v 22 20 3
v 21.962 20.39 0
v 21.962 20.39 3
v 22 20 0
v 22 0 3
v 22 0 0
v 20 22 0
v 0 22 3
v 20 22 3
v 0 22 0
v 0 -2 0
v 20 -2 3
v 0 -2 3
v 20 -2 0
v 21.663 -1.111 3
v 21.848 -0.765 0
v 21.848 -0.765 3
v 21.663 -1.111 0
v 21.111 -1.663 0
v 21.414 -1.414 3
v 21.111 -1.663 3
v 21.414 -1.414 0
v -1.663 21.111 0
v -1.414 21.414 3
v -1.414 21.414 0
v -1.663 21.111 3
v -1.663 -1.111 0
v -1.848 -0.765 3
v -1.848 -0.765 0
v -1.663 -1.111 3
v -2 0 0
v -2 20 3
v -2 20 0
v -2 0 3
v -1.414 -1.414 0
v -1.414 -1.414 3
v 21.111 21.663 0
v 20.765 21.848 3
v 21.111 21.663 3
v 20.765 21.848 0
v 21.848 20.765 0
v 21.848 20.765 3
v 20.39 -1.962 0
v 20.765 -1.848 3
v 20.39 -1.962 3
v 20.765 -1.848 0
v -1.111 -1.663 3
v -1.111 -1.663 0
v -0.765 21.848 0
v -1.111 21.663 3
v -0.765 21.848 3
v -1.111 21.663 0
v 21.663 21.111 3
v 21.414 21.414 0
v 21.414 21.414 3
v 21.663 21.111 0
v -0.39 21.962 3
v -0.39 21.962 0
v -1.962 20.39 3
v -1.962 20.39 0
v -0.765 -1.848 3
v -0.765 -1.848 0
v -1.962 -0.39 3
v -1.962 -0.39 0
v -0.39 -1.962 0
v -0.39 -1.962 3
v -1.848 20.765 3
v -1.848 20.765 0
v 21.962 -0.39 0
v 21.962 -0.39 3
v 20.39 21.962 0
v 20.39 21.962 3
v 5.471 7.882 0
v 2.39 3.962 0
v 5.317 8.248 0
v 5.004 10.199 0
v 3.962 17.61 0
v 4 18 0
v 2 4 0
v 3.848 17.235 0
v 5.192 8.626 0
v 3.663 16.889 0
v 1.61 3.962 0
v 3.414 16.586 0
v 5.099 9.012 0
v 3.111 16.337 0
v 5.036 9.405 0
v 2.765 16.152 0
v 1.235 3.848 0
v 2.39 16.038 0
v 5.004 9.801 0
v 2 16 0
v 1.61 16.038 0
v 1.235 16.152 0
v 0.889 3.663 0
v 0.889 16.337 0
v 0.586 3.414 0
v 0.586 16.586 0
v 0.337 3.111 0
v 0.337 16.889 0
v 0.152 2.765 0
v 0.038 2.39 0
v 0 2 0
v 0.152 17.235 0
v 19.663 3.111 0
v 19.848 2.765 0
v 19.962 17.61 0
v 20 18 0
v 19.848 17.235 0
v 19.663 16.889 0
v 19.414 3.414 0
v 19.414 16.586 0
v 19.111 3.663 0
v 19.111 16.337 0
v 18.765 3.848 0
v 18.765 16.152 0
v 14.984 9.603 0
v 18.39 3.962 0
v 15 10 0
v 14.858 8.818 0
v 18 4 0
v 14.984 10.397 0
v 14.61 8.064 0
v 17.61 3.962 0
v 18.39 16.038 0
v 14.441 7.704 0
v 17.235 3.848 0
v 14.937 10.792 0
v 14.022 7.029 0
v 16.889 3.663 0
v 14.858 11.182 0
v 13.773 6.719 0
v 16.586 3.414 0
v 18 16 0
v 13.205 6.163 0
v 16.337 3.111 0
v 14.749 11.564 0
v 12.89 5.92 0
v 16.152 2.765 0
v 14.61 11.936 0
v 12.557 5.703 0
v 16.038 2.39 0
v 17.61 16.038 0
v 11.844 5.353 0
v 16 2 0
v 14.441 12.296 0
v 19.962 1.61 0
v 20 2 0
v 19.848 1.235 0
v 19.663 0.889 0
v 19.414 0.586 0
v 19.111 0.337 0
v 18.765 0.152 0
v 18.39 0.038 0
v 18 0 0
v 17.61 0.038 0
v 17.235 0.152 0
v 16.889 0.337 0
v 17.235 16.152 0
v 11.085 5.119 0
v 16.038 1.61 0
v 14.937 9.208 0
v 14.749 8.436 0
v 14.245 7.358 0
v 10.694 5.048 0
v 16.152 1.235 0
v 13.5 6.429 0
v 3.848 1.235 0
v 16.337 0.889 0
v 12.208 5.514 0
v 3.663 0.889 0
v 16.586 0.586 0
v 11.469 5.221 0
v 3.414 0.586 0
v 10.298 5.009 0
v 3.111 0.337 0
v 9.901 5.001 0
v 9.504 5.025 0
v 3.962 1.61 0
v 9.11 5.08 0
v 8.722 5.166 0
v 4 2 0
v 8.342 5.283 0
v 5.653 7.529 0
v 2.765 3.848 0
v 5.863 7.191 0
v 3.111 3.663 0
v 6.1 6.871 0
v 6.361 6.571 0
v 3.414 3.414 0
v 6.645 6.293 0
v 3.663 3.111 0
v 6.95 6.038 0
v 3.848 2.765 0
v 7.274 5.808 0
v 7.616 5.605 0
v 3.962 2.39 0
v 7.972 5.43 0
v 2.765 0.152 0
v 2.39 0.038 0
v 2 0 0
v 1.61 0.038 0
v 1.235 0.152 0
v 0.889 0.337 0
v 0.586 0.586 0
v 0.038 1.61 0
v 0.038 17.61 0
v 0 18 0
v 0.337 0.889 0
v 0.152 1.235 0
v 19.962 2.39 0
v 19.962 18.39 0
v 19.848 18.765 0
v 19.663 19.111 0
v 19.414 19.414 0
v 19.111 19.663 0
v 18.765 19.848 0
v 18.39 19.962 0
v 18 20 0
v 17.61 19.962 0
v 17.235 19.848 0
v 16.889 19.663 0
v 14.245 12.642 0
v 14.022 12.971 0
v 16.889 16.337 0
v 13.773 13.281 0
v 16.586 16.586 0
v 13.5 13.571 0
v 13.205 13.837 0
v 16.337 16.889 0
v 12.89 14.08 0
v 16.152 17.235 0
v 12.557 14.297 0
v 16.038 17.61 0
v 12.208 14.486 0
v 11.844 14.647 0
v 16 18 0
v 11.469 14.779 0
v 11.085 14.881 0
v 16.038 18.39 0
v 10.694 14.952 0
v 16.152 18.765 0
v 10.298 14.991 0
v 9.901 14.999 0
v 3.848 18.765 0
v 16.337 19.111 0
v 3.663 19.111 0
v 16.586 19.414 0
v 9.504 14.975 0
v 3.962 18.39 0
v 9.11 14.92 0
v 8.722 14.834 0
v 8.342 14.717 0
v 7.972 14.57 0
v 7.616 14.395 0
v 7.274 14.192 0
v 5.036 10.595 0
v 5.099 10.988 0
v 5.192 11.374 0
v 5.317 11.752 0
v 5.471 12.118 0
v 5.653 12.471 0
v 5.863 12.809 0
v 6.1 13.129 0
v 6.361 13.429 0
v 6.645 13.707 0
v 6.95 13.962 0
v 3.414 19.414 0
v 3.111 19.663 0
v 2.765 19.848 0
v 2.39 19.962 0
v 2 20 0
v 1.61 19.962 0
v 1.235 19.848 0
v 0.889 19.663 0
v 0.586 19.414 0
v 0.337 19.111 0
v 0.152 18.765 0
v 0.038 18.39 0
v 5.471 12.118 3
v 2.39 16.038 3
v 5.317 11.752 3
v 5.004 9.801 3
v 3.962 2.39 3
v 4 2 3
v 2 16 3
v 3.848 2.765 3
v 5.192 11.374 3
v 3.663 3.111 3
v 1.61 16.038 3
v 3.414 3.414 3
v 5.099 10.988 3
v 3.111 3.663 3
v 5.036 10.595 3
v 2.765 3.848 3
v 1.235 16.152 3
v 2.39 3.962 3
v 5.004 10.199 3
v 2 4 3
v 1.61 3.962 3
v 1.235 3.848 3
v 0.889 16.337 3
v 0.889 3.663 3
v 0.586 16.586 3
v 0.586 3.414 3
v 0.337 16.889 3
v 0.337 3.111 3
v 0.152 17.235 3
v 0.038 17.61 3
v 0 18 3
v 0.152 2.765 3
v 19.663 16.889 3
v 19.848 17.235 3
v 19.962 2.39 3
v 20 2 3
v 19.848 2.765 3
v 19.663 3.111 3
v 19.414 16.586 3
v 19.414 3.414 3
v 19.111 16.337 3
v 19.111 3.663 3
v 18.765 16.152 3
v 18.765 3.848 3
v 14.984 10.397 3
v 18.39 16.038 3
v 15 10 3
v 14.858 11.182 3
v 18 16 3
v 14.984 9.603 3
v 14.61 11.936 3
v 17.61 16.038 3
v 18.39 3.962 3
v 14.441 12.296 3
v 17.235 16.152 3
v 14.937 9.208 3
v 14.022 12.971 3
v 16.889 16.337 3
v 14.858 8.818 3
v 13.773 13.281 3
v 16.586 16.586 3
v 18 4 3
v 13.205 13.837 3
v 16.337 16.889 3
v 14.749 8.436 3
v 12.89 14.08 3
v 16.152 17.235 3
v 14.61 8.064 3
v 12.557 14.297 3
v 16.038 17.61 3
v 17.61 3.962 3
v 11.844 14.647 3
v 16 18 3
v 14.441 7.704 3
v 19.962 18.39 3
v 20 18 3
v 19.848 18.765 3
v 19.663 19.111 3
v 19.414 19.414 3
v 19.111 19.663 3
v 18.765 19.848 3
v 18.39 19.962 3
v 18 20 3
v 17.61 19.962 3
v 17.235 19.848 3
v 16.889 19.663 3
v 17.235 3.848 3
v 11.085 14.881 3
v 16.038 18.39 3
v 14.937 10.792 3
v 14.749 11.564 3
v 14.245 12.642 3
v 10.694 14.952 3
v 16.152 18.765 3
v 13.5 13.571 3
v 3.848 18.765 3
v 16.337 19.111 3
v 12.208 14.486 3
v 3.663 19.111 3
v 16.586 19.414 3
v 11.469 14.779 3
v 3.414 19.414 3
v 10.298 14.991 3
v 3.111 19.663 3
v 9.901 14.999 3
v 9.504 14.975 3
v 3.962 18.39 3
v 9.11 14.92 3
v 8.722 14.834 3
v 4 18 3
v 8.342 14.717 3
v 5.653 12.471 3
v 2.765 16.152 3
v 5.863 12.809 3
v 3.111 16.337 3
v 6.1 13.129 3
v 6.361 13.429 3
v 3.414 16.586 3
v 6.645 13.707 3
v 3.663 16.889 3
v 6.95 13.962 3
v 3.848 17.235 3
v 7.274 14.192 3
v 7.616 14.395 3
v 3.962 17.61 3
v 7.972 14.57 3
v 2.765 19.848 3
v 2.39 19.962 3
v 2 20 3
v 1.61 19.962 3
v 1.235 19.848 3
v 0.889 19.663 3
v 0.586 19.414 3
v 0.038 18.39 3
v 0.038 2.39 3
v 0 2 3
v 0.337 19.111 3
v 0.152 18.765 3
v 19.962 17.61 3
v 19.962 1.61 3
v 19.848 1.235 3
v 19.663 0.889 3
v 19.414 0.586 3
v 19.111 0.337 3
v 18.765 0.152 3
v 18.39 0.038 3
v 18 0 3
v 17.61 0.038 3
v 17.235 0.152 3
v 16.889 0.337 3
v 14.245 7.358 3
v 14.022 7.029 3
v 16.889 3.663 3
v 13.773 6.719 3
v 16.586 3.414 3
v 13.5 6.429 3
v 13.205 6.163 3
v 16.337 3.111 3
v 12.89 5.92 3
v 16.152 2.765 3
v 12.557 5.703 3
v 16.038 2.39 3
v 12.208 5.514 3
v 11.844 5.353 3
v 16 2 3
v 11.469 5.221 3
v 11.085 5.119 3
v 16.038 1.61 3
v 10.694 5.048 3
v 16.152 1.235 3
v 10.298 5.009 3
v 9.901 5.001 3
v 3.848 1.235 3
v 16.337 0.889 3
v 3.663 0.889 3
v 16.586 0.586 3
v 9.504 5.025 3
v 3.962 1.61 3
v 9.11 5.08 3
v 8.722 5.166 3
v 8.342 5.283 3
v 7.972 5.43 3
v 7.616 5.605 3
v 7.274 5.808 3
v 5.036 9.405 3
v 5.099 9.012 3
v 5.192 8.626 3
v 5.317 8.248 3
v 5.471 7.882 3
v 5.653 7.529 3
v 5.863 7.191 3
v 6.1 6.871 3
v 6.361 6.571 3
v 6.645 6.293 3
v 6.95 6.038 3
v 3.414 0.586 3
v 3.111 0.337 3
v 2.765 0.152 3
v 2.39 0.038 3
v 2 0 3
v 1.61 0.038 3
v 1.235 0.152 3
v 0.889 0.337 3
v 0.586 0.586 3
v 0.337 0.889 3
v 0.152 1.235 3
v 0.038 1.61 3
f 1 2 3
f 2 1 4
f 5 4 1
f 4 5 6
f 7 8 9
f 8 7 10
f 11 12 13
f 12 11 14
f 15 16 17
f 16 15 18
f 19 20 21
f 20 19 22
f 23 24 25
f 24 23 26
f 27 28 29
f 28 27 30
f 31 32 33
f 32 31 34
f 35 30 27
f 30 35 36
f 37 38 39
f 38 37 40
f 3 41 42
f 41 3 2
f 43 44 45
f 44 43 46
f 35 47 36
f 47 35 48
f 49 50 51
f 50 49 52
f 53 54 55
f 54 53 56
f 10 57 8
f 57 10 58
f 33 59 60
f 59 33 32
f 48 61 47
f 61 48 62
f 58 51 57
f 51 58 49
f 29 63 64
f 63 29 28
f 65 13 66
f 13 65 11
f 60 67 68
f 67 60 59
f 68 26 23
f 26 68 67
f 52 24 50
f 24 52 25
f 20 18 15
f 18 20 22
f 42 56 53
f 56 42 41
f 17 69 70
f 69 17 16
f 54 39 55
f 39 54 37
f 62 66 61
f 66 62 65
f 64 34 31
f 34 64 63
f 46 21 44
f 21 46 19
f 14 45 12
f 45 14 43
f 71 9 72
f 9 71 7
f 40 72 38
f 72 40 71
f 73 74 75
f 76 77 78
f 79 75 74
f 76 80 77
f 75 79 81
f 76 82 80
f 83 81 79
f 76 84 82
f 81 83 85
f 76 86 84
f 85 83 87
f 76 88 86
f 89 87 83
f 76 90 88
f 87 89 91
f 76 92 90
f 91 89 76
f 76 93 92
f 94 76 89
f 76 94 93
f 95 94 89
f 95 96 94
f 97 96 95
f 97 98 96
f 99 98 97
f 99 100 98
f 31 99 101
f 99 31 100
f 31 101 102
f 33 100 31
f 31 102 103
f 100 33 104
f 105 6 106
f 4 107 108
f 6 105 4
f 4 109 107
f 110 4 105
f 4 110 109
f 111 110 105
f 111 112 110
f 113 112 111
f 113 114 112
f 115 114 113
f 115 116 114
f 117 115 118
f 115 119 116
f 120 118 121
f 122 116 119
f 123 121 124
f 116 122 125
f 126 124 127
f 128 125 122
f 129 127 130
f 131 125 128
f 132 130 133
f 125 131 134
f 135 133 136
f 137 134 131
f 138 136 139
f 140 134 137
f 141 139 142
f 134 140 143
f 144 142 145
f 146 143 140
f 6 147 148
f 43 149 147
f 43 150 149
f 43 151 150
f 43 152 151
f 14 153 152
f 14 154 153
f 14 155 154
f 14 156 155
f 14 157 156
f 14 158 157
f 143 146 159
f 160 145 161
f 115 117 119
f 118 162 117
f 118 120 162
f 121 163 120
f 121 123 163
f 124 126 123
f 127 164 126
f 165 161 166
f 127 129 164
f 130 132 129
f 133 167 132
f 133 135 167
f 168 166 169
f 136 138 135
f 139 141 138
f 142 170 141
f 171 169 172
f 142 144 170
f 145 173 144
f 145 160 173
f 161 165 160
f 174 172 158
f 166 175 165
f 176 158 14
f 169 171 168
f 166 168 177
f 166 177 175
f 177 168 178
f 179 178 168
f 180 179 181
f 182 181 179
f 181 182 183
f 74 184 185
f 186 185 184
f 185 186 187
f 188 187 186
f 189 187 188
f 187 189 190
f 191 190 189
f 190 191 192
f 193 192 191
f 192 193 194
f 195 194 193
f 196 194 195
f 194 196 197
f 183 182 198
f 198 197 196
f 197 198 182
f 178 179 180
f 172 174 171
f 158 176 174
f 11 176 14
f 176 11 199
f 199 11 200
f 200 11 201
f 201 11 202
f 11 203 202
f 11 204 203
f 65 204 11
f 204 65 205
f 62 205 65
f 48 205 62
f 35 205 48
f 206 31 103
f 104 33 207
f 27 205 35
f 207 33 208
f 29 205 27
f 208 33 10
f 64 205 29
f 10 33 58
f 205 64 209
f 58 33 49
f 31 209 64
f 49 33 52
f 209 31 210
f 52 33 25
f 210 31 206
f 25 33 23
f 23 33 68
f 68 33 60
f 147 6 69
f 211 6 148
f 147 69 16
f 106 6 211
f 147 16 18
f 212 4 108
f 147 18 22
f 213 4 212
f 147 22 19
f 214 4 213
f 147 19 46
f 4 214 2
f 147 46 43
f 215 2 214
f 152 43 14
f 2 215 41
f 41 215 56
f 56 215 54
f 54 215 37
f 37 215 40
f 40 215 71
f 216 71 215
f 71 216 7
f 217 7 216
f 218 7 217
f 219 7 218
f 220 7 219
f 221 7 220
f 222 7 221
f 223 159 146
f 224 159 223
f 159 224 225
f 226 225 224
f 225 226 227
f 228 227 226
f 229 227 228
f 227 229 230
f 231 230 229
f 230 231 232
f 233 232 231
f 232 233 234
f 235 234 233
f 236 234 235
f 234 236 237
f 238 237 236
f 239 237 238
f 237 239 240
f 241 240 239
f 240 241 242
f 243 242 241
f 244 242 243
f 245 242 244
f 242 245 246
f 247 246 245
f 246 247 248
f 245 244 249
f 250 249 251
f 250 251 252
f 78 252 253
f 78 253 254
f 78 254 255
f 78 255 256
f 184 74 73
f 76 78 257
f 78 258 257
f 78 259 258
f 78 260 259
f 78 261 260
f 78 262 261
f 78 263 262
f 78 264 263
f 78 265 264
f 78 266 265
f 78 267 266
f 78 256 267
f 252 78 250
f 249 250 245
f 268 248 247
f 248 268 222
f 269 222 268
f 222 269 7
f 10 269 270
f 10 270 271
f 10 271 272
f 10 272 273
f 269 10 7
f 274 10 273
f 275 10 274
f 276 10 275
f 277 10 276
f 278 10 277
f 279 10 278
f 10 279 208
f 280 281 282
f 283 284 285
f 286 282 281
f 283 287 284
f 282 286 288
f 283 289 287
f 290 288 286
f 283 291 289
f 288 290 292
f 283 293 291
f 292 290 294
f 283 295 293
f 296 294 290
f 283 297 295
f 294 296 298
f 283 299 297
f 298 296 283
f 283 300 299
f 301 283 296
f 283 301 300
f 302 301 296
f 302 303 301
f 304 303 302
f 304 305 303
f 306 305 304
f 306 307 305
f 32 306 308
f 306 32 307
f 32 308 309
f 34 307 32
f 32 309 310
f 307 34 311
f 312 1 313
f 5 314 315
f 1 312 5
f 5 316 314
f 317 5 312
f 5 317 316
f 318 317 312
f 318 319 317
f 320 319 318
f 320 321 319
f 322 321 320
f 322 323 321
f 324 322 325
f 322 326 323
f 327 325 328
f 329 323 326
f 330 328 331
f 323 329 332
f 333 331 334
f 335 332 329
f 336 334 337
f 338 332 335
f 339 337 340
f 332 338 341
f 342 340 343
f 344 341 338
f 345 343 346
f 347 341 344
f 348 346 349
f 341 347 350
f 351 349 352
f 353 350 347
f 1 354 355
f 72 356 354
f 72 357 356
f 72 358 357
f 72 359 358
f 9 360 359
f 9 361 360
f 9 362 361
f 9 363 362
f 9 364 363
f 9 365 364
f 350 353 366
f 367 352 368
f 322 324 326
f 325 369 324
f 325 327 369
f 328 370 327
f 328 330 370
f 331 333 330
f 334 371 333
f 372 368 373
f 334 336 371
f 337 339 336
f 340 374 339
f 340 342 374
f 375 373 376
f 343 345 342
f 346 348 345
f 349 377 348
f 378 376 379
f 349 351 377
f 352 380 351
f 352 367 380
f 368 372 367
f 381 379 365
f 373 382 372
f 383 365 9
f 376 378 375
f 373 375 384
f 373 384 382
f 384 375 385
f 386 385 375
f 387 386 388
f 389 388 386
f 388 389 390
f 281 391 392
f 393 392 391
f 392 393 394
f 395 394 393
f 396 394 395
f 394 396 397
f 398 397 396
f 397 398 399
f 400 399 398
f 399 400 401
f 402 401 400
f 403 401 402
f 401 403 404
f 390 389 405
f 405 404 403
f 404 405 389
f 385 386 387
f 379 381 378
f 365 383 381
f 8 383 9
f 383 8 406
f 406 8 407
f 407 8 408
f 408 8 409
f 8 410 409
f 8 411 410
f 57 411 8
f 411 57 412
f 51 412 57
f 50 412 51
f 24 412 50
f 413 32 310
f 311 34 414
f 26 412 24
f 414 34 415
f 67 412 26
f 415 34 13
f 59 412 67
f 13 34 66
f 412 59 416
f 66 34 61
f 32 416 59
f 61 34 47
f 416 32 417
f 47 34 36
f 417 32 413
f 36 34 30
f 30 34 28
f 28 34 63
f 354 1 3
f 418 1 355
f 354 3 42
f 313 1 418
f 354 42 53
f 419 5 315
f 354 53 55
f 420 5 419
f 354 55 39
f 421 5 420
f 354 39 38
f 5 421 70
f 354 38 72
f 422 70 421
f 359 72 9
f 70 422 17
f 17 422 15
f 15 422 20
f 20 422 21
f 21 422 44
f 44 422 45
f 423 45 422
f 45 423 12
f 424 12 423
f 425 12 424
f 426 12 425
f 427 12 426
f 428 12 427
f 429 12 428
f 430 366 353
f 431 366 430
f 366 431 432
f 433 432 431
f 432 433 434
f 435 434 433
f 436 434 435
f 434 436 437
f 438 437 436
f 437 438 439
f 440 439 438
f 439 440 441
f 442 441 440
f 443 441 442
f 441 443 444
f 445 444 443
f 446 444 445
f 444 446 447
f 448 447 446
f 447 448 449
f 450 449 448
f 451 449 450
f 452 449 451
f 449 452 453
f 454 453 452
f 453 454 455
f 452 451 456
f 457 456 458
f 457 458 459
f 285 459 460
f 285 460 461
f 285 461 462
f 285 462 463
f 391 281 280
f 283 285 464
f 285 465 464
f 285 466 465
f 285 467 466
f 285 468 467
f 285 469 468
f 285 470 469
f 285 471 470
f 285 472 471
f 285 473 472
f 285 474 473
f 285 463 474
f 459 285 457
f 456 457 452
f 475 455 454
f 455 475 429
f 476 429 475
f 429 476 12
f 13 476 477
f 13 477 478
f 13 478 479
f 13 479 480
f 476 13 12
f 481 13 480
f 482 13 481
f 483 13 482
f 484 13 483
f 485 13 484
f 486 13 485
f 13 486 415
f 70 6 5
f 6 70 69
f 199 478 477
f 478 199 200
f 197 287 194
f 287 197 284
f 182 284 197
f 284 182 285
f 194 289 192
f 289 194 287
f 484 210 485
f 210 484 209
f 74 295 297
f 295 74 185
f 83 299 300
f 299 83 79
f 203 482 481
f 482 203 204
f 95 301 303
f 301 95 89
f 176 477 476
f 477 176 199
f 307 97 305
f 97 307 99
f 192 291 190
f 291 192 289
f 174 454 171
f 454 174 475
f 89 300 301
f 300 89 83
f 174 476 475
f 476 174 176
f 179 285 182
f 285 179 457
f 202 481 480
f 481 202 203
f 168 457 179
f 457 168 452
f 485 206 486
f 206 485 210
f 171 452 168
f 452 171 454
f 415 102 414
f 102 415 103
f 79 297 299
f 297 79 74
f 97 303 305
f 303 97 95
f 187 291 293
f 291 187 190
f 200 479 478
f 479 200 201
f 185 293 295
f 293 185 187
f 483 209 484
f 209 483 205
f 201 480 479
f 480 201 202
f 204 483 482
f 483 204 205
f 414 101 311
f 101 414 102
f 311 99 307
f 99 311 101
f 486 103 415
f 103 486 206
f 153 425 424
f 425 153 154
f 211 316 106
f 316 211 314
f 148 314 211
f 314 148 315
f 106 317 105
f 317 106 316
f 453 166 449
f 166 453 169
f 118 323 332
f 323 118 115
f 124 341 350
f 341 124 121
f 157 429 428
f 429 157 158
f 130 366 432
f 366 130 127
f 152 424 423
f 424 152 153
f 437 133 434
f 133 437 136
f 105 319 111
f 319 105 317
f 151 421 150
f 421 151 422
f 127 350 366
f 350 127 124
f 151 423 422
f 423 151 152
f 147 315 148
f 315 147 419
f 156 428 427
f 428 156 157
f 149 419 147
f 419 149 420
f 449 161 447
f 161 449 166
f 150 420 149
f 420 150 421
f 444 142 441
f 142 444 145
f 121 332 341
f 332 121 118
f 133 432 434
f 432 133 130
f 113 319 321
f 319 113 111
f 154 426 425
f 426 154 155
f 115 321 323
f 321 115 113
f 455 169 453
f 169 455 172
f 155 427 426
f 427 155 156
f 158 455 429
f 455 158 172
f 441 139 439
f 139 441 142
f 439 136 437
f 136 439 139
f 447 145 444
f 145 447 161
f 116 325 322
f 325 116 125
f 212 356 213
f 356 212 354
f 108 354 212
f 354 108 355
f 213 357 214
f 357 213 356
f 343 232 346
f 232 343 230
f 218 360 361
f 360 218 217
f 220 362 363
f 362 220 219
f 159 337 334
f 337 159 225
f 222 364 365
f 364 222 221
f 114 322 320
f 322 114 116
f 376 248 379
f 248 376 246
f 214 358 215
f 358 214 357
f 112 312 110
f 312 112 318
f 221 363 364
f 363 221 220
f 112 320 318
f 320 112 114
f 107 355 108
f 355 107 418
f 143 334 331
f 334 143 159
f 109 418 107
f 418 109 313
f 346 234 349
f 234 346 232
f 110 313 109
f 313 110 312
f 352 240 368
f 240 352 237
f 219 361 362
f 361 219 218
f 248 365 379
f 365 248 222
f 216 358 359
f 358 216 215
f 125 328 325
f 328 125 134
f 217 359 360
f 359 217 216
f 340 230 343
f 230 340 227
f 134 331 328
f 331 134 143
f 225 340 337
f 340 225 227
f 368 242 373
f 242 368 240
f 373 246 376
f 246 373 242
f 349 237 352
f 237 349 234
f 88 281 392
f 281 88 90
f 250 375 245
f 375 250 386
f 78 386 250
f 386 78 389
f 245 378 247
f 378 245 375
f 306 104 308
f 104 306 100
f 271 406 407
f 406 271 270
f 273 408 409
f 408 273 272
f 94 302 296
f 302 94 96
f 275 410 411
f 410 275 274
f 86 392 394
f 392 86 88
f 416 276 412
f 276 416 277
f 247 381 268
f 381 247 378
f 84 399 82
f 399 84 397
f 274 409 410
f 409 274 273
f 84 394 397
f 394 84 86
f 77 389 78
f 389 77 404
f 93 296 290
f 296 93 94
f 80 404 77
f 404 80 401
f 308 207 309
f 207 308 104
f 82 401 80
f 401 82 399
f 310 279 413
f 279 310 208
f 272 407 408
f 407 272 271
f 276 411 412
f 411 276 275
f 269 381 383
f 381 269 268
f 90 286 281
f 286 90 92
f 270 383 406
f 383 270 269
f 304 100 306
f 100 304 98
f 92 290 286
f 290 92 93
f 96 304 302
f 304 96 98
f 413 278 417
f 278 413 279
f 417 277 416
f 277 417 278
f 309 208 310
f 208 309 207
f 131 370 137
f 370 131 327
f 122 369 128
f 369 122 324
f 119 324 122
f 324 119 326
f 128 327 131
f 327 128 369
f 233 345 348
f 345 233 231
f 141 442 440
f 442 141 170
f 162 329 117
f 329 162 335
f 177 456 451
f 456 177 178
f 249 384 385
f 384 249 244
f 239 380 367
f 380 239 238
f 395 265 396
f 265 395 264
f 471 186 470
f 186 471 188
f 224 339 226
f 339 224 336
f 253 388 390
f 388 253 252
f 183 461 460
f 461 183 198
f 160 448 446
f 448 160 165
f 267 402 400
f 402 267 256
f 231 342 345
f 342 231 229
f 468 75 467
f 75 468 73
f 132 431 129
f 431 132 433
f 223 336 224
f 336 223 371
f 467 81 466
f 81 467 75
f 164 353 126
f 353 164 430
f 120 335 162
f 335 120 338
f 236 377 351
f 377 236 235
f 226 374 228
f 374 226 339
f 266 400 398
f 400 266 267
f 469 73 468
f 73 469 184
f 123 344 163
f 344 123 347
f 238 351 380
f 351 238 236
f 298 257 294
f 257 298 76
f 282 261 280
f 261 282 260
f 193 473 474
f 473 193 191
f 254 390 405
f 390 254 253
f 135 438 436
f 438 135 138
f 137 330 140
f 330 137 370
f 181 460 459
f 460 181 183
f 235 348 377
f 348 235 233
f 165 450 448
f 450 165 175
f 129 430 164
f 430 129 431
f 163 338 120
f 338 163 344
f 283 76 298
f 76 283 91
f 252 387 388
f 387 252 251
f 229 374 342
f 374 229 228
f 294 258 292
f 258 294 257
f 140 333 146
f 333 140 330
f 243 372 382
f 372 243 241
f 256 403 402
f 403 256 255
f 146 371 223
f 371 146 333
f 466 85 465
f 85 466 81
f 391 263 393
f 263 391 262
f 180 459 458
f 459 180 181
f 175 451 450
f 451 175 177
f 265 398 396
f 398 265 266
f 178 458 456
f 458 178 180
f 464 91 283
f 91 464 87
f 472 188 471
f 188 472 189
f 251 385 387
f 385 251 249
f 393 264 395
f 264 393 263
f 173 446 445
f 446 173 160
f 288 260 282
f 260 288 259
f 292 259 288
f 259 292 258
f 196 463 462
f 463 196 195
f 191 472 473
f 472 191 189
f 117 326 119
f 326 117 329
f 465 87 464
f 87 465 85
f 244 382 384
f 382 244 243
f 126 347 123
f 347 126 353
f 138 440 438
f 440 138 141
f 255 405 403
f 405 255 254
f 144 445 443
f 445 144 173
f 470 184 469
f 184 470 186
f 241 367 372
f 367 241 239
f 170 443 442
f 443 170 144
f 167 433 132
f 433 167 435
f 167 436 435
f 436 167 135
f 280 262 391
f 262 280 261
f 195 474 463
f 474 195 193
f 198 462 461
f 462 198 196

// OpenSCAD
width = 20;
$fs = 0.4;
$fa = 1;

difference() {
	hull() {
		cylinder(r=2, h=3);
		translate([width, 0, 0]) {
			cylinder(r=2, h=3);
		}
		translate([width, width, 0]) {
			cylinder(r=2, h=3);
		}
		translate([0, width, 0]) {
			cylinder(r=2, h=3);
		}
	}
	translate([2, 2, -1]) {
		cylinder(r=2, h=5);
	}
	translate([width - 2, 2, -1]) {
		cylinder(r=2, h=5);
	}
	translate([width - 2, width - 2, -1]) {
		cylinder(r=2, h=5);
	}
	translate([2, width - 2, -1]) {
		cylinder(r=2, h=5);
	}
	translate([width / 2, width / 2, -1]) {
		cylinder(r=5, h=5);
	}
}
